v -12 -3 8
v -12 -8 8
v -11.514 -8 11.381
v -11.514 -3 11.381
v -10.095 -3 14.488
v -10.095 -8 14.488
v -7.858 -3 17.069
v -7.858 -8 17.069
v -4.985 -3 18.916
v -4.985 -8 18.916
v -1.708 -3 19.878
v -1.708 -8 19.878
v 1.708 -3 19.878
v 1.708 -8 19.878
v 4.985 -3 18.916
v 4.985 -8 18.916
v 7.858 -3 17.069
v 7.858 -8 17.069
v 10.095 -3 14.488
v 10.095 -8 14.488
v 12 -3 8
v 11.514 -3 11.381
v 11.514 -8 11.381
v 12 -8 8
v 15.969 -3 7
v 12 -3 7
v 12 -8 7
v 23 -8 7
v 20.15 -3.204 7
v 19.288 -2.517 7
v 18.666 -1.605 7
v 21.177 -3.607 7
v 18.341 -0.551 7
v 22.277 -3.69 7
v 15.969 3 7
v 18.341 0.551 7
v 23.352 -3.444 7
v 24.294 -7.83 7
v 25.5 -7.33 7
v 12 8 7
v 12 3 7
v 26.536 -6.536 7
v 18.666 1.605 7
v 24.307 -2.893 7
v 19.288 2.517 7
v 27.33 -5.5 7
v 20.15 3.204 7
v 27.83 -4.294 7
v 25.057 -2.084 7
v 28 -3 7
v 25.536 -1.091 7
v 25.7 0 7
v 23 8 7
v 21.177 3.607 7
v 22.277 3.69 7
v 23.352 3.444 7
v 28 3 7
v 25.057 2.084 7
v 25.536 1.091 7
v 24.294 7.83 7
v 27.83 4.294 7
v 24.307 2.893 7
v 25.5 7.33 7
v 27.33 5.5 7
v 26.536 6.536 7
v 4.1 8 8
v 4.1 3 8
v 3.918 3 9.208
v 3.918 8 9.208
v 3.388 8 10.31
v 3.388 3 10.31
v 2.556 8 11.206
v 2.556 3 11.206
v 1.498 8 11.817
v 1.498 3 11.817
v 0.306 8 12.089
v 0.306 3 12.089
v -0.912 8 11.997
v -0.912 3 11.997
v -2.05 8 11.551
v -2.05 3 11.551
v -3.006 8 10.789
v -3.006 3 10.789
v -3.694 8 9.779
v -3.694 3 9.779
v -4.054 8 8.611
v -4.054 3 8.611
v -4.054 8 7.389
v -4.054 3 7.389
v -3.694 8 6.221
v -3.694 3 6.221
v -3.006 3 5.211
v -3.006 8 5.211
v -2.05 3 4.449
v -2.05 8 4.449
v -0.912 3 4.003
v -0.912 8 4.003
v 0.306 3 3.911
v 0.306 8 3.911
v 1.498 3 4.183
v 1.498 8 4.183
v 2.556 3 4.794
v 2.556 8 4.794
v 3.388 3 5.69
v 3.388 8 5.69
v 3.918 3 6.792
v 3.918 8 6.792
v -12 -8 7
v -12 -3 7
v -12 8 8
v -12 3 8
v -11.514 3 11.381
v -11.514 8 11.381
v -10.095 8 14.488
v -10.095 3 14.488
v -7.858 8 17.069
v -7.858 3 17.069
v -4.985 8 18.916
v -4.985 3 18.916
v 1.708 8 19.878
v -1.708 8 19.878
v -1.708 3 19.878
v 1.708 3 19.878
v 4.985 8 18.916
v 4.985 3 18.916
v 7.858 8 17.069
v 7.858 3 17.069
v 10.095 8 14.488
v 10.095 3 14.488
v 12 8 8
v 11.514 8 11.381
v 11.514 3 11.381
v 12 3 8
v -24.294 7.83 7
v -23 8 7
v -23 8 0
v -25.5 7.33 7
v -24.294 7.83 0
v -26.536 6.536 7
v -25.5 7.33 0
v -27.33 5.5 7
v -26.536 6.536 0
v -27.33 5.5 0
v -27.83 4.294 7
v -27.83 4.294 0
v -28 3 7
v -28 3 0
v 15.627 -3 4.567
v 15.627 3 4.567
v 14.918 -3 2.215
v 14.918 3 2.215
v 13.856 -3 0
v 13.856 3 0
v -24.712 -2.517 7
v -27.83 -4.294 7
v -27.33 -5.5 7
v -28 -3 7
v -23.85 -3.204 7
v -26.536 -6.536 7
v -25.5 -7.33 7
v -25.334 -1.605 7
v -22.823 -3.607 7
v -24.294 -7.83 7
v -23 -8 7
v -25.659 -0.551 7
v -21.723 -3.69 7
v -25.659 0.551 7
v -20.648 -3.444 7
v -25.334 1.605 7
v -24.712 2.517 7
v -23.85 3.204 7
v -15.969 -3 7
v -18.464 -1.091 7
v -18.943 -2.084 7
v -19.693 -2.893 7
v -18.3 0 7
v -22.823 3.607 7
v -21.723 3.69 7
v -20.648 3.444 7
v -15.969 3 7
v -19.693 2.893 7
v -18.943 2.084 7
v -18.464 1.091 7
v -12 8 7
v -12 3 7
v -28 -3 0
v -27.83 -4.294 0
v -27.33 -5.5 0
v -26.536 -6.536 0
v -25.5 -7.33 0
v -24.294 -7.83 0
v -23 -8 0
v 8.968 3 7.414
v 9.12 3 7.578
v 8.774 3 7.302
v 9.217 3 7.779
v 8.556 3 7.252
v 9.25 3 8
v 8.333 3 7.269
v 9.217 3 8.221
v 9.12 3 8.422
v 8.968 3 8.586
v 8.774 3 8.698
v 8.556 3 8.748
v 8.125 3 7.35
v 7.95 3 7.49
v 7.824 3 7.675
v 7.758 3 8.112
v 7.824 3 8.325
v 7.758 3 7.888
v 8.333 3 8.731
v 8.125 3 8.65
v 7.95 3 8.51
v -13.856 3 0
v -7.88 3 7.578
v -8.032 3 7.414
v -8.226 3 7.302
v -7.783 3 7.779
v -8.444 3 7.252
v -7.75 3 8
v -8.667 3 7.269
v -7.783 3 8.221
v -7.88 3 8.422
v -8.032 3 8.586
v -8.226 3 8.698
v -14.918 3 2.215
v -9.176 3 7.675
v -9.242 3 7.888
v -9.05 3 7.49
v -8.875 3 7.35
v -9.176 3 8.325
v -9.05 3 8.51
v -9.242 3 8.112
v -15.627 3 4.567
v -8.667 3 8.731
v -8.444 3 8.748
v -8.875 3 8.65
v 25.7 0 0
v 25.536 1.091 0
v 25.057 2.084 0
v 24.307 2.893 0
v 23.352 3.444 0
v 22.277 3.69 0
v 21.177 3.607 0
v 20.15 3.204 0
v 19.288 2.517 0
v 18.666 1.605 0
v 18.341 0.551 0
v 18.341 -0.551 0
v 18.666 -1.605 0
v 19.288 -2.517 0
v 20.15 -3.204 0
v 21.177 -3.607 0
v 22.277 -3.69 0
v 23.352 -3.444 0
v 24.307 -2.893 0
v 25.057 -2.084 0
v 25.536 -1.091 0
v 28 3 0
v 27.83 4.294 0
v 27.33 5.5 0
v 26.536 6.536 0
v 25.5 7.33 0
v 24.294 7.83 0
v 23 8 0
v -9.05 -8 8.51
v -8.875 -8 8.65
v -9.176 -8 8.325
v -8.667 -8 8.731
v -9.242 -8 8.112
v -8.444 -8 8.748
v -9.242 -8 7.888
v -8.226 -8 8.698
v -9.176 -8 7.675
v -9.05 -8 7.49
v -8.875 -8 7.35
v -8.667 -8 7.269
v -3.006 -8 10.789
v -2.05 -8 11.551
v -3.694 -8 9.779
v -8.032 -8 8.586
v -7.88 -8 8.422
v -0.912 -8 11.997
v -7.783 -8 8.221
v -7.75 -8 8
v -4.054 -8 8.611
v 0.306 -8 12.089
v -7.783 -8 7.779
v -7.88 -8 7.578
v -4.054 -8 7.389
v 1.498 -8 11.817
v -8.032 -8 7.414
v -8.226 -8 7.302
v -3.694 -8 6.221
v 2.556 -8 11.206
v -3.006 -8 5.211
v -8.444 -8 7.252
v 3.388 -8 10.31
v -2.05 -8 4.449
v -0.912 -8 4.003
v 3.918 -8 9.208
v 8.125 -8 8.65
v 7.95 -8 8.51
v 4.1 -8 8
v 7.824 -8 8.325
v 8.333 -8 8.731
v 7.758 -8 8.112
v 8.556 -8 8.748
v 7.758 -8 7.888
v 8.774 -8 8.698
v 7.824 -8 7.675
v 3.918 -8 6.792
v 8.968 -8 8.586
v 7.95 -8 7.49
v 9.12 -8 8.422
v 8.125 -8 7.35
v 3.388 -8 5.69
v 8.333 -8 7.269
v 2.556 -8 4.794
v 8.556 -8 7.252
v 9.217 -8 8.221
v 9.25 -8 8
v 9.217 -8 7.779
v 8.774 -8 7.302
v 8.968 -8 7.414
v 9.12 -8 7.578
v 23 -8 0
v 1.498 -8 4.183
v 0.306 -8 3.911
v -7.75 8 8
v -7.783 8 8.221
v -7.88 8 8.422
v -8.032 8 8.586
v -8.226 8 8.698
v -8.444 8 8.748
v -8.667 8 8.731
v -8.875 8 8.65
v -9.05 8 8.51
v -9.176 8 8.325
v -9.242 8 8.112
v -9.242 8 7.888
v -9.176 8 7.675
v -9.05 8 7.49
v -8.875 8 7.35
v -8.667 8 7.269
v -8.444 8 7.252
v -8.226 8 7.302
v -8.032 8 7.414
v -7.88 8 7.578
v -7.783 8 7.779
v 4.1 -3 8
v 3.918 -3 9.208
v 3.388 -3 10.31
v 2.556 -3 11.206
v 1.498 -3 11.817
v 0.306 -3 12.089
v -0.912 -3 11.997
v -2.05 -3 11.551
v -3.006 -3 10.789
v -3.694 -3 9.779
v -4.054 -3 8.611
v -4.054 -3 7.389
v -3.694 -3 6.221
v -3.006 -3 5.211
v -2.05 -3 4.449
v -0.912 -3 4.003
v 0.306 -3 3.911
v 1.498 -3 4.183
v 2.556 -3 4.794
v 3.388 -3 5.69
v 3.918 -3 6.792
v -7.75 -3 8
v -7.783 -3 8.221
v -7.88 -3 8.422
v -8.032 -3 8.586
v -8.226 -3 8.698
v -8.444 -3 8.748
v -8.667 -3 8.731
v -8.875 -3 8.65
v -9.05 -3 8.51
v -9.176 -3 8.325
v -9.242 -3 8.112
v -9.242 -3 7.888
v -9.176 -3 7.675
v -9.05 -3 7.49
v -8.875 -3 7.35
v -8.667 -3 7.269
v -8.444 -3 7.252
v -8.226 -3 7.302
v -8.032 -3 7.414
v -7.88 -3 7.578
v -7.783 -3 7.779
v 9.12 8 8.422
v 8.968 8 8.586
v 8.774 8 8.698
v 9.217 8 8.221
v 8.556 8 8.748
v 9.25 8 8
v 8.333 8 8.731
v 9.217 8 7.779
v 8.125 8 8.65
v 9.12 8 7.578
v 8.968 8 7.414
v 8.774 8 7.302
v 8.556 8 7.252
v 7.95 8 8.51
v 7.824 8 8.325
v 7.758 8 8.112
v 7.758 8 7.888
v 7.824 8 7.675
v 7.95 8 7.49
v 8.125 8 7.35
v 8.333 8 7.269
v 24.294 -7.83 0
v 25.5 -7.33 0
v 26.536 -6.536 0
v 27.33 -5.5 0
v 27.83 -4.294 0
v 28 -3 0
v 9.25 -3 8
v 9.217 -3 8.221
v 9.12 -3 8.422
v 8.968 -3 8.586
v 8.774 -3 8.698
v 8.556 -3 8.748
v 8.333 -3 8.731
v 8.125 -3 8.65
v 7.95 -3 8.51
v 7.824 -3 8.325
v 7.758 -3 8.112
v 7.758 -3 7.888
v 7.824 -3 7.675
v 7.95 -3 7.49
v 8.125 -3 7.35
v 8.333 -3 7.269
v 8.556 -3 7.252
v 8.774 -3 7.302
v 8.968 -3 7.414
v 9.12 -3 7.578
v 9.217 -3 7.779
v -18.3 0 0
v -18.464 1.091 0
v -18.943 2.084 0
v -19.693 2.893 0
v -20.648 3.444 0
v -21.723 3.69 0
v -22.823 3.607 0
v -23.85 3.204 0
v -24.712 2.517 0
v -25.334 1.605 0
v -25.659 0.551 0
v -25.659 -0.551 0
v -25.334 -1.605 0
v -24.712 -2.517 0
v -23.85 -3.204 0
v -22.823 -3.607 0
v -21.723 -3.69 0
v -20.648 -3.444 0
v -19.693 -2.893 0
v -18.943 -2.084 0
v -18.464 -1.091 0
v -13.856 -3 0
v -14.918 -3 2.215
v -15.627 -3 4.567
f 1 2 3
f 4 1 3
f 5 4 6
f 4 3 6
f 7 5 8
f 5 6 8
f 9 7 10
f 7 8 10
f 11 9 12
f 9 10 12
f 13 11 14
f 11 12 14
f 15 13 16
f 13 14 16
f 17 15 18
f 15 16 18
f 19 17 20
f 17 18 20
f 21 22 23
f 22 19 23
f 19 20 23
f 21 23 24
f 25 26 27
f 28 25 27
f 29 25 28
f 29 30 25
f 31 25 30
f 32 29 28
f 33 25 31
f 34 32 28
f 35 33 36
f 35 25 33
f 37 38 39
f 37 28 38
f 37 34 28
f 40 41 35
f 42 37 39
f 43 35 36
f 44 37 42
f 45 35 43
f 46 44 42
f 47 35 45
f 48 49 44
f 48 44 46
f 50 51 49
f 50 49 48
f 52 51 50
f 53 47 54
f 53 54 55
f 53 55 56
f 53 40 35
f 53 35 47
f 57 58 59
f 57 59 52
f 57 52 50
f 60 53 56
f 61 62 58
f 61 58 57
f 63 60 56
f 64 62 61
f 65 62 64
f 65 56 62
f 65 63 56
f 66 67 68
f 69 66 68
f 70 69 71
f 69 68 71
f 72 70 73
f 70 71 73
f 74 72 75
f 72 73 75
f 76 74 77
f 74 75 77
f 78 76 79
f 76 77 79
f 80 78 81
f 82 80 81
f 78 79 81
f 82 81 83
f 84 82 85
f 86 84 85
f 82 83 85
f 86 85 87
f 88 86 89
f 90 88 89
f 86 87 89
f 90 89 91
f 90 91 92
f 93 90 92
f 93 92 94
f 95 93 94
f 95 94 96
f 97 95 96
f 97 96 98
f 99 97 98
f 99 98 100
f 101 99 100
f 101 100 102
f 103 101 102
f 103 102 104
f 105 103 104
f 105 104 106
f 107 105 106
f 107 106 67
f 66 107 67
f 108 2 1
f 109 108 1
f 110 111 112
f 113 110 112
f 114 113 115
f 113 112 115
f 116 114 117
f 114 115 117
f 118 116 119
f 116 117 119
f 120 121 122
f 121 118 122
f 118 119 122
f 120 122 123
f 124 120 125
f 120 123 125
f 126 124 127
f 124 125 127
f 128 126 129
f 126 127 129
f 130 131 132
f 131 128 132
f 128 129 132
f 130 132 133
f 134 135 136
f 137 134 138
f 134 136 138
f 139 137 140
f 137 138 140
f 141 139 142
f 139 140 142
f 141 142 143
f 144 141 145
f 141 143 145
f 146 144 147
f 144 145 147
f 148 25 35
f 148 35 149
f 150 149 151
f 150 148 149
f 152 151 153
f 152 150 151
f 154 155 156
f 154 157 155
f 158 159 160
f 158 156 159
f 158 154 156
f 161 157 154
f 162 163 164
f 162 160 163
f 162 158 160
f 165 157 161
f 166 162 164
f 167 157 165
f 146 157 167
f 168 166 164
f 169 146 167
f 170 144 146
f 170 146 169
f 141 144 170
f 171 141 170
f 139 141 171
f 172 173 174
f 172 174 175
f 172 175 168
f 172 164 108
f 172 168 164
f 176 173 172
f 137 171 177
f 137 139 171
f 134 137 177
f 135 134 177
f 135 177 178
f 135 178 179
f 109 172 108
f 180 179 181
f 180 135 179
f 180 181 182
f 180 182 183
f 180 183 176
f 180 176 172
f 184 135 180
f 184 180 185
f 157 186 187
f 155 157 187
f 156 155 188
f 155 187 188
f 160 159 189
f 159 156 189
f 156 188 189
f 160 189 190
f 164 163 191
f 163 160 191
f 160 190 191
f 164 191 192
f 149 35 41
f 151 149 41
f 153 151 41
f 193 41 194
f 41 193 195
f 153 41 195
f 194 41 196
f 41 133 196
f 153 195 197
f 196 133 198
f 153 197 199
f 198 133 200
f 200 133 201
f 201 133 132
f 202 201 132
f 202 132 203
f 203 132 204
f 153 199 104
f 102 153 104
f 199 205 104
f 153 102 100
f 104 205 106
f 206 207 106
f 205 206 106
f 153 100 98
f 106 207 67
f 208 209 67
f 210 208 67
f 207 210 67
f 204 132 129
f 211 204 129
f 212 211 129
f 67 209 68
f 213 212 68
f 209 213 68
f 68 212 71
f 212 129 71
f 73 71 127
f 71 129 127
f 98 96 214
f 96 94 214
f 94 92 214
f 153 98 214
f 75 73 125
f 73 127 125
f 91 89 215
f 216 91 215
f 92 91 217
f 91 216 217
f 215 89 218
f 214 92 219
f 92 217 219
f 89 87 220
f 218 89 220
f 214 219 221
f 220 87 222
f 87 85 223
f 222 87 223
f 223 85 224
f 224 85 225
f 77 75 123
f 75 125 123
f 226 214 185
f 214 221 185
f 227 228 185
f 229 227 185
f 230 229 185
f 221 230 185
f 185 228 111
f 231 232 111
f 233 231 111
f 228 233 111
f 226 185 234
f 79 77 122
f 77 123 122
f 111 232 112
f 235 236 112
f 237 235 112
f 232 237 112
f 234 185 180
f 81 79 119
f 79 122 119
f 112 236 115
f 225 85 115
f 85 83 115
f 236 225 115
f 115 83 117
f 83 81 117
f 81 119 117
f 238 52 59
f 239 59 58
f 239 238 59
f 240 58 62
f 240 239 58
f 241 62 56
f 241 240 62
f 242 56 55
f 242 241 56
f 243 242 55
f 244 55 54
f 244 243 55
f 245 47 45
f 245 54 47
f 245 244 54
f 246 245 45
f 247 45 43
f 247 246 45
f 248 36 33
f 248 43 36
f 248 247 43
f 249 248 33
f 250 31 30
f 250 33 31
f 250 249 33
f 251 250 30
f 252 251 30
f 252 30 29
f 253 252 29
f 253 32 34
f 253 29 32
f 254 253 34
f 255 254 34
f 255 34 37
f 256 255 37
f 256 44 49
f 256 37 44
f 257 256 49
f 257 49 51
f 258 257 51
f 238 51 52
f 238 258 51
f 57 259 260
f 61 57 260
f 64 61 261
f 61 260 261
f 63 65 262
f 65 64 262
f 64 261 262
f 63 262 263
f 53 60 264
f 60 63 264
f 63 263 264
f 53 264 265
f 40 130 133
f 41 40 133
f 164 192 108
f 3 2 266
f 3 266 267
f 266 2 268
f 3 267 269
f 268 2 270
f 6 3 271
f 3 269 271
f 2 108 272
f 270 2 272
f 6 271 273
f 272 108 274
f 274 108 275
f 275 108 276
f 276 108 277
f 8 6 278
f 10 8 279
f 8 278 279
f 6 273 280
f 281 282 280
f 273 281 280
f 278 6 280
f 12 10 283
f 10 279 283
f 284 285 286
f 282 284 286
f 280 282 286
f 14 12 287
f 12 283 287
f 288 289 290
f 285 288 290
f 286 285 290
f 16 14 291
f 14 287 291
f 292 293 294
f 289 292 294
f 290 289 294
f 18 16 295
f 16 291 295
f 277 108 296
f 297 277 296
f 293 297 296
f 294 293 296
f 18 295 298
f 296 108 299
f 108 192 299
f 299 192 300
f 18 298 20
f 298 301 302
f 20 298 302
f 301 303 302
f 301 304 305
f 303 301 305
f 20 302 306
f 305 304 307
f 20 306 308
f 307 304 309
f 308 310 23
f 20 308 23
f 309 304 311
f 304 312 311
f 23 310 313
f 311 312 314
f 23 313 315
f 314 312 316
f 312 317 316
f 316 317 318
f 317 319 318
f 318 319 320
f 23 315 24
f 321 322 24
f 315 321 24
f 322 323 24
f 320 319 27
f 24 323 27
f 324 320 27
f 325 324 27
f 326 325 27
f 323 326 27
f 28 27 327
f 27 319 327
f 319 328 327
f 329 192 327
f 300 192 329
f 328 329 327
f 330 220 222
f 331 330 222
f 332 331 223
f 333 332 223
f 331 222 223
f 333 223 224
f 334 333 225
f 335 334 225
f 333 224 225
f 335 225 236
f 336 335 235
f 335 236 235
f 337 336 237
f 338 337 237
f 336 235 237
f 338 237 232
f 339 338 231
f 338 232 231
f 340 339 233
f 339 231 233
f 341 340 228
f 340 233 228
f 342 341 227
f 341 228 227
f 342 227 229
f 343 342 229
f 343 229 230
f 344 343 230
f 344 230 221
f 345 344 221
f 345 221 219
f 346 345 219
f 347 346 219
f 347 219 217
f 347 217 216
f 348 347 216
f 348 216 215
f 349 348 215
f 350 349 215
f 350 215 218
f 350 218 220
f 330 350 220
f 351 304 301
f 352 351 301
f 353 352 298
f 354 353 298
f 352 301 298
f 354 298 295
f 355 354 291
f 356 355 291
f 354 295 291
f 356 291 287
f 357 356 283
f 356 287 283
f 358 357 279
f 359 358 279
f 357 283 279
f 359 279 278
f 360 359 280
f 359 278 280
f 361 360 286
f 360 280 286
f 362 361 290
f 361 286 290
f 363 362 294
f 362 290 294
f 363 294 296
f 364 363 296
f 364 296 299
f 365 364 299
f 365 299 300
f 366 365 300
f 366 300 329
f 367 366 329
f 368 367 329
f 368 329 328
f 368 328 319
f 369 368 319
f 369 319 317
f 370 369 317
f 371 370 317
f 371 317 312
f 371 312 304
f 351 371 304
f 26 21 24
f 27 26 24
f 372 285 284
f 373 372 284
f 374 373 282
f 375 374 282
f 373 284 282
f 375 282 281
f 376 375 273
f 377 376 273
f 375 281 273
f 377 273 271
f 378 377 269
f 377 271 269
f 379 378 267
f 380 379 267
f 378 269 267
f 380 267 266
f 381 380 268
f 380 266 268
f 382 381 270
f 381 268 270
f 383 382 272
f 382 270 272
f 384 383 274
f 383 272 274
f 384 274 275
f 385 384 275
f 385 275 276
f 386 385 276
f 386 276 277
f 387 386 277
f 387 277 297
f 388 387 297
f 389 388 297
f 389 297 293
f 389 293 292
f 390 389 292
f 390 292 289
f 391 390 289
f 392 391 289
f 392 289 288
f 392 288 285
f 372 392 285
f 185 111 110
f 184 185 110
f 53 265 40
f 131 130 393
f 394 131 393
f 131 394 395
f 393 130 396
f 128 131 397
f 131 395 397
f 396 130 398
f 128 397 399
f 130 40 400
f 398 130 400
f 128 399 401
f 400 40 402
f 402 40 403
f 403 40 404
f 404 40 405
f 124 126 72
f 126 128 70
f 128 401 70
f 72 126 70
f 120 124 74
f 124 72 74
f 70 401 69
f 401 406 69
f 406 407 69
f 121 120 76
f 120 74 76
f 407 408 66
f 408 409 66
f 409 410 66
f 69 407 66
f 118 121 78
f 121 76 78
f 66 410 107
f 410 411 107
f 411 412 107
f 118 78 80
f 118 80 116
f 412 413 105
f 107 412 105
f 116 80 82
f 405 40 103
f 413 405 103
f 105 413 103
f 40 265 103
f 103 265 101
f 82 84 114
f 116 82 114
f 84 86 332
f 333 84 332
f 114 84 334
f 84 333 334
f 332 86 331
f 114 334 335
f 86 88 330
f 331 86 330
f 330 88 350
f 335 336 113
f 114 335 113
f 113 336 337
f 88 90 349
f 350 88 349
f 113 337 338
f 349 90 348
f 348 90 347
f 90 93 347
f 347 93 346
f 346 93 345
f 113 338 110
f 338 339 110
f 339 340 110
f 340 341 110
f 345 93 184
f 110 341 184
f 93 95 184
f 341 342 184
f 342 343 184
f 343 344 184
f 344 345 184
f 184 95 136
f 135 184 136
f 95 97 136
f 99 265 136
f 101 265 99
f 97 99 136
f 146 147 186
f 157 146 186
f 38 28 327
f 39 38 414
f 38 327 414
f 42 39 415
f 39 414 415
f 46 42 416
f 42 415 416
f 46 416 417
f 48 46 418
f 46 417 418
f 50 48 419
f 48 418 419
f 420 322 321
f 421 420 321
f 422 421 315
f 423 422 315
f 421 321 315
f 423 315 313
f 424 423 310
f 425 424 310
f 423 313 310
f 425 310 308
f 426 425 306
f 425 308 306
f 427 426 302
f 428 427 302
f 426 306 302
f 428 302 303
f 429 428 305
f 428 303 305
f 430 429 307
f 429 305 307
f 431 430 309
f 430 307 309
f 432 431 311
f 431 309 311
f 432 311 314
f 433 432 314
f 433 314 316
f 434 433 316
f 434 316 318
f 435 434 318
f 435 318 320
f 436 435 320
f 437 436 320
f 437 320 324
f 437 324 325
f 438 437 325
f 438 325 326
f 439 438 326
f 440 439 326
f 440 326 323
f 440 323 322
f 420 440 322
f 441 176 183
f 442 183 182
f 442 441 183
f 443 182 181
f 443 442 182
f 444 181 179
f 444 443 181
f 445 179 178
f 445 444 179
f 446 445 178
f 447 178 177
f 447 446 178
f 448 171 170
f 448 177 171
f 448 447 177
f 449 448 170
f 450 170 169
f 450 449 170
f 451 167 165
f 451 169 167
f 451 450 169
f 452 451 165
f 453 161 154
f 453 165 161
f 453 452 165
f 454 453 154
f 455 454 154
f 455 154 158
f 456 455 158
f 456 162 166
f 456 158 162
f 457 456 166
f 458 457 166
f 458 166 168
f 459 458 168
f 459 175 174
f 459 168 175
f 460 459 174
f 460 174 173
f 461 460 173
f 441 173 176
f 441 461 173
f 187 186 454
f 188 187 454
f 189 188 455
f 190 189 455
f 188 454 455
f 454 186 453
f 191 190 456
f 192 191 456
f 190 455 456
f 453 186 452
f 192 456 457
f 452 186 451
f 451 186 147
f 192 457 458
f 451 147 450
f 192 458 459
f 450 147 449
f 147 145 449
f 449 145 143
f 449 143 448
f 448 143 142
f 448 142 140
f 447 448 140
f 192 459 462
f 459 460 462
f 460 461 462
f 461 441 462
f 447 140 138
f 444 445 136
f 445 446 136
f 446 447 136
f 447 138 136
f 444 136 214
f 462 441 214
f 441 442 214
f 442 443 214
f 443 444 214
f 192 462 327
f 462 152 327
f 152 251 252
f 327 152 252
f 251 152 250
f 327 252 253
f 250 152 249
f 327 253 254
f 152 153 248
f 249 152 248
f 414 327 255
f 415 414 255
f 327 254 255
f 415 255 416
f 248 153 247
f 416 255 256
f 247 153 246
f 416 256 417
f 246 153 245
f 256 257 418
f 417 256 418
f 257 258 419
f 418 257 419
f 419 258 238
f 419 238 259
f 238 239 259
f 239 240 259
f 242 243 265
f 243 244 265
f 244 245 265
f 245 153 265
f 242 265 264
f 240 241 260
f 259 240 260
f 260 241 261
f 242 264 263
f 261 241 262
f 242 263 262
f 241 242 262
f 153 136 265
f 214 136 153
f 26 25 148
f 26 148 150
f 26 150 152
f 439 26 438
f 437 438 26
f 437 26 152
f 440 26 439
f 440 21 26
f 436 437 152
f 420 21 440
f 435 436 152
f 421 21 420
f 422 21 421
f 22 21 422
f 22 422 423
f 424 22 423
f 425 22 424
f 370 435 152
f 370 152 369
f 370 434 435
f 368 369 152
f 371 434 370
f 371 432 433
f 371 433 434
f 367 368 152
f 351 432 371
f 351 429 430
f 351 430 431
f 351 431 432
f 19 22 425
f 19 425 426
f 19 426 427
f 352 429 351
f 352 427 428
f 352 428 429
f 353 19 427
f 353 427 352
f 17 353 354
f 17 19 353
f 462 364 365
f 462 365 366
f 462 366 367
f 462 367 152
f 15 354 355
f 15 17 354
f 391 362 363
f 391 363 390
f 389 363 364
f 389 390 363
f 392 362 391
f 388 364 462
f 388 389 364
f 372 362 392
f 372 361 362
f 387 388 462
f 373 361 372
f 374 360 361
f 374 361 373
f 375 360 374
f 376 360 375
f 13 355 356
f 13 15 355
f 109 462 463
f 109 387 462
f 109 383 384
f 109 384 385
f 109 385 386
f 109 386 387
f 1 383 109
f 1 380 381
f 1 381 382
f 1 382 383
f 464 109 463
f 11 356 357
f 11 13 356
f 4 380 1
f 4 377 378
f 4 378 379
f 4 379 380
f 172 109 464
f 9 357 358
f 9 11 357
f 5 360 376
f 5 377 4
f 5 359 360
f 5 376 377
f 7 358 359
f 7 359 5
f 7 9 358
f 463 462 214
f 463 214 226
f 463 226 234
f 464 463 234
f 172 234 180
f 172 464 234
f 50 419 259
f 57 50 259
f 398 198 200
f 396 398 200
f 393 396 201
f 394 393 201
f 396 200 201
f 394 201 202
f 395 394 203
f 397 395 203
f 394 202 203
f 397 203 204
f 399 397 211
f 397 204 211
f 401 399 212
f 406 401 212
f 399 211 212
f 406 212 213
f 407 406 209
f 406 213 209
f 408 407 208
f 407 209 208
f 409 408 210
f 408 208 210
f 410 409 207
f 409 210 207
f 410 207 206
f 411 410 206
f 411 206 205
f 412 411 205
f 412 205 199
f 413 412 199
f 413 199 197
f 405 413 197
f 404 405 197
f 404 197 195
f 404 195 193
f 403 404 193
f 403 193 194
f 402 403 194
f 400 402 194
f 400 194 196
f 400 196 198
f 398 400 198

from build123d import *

# Parameters (mm, degrees)
F0_R     = 3.7
F1_DEPTH = 25
F2_W     = 81.575442
F2_H     = 50.133398
F3_DEPTH = 18
F4_R     = 4.1
F4_R_2   = 0.75
F5_DEPTH = 16.001
F6_R     = 16
F7_DEPTH = 6


with BuildPart() as f1:
    # F0 (on Top) → F1 (new body)
    with BuildSketch(Plane.XY):
        with BuildLine():
            Line((-28, 3), (-28, 0))
            Line((-28, 0), (-28, -3))
            ThreePointArc((-28, -3), (-26.535534, -6.535534), (-23, -8))
            Line((-23, -8), (0, -8))
            Line((0, -8), (23, -8))
            ThreePointArc((23, -8), (26.535534, -6.535534), (28, -3))
            Line((28, -3), (28, 0))
            Line((28, 0), (28, 3))
            ThreePointArc((28, 3), (26.535534, 6.535534), (23, 8))
            Line((23, 8), (0, 8))
            Line((0, 8), (-23, 8))
            ThreePointArc((-23, 8), (-26.535534, 6.535534), (-28, 3))
        make_face()
        with Locations((-22, 0)):
            Circle(F0_R, mode=Mode.SUBTRACT)
        with Locations((22, 0)):
            Circle(F0_R, mode=Mode.SUBTRACT)
    extrude(amount=F1_DEPTH)

    # F2 (on face) → F3 (cut)
    with BuildSketch(Plane.XY.offset(25)):
        with Locations((1.883624, -0.796919)):
            Rectangle(F2_W, F2_H)
        Polygon((0, -3), (12, -3), (12, -8), (0, -8), (-12, -8), (-12, -3), align=None, mode=Mode.SUBTRACT)
        Polygon((12, 3), (0, 3), (-12, 3), (-12, 8), (0, 8), (12, 8), align=None, mode=Mode.SUBTRACT)
    extrude(amount=-F3_DEPTH, mode=Mode.SUBTRACT)

    # F4 (on face) → F5 (cut, through all)
    with BuildSketch(Plane.XZ.offset(8)):
        with Locations((0, 8)):
            Circle(F4_R)
        with Locations((-8.5, 8)):
            Circle(F4_R_2)
        with Locations((8.5, 8)):
            Circle(F4_R_2)
        with BuildLine():
            Line((-15.281343, 8), (-12, 8))
            ThreePointArc((-12, 8), (0, 20), (12, 8))
            Line((12, 8), (15.281343, 8))
            Line((15.281343, 8), (15.281343, 26.349186))
            Line((15.281343, 26.349186), (0, 26.349186))
            Line((0, 26.349186), (-15.281343, 26.349186))
            Line((-15.281343, 26.349186), (-15.281343, 8))
        make_face()
    extrude(amount=-F5_DEPTH, mode=Mode.SUBTRACT)

    # F6 (on face) → F7 (cut)
    with BuildSketch(Plane(origin=(0, -3, 0), x_dir=(-1, 0, 0), z_dir=(0, 1, 0))):
        with Locations((0, 8)):
            Circle(F6_R)
    extrude(amount=F7_DEPTH, mode=Mode.SUBTRACT)


solid = f1.part
